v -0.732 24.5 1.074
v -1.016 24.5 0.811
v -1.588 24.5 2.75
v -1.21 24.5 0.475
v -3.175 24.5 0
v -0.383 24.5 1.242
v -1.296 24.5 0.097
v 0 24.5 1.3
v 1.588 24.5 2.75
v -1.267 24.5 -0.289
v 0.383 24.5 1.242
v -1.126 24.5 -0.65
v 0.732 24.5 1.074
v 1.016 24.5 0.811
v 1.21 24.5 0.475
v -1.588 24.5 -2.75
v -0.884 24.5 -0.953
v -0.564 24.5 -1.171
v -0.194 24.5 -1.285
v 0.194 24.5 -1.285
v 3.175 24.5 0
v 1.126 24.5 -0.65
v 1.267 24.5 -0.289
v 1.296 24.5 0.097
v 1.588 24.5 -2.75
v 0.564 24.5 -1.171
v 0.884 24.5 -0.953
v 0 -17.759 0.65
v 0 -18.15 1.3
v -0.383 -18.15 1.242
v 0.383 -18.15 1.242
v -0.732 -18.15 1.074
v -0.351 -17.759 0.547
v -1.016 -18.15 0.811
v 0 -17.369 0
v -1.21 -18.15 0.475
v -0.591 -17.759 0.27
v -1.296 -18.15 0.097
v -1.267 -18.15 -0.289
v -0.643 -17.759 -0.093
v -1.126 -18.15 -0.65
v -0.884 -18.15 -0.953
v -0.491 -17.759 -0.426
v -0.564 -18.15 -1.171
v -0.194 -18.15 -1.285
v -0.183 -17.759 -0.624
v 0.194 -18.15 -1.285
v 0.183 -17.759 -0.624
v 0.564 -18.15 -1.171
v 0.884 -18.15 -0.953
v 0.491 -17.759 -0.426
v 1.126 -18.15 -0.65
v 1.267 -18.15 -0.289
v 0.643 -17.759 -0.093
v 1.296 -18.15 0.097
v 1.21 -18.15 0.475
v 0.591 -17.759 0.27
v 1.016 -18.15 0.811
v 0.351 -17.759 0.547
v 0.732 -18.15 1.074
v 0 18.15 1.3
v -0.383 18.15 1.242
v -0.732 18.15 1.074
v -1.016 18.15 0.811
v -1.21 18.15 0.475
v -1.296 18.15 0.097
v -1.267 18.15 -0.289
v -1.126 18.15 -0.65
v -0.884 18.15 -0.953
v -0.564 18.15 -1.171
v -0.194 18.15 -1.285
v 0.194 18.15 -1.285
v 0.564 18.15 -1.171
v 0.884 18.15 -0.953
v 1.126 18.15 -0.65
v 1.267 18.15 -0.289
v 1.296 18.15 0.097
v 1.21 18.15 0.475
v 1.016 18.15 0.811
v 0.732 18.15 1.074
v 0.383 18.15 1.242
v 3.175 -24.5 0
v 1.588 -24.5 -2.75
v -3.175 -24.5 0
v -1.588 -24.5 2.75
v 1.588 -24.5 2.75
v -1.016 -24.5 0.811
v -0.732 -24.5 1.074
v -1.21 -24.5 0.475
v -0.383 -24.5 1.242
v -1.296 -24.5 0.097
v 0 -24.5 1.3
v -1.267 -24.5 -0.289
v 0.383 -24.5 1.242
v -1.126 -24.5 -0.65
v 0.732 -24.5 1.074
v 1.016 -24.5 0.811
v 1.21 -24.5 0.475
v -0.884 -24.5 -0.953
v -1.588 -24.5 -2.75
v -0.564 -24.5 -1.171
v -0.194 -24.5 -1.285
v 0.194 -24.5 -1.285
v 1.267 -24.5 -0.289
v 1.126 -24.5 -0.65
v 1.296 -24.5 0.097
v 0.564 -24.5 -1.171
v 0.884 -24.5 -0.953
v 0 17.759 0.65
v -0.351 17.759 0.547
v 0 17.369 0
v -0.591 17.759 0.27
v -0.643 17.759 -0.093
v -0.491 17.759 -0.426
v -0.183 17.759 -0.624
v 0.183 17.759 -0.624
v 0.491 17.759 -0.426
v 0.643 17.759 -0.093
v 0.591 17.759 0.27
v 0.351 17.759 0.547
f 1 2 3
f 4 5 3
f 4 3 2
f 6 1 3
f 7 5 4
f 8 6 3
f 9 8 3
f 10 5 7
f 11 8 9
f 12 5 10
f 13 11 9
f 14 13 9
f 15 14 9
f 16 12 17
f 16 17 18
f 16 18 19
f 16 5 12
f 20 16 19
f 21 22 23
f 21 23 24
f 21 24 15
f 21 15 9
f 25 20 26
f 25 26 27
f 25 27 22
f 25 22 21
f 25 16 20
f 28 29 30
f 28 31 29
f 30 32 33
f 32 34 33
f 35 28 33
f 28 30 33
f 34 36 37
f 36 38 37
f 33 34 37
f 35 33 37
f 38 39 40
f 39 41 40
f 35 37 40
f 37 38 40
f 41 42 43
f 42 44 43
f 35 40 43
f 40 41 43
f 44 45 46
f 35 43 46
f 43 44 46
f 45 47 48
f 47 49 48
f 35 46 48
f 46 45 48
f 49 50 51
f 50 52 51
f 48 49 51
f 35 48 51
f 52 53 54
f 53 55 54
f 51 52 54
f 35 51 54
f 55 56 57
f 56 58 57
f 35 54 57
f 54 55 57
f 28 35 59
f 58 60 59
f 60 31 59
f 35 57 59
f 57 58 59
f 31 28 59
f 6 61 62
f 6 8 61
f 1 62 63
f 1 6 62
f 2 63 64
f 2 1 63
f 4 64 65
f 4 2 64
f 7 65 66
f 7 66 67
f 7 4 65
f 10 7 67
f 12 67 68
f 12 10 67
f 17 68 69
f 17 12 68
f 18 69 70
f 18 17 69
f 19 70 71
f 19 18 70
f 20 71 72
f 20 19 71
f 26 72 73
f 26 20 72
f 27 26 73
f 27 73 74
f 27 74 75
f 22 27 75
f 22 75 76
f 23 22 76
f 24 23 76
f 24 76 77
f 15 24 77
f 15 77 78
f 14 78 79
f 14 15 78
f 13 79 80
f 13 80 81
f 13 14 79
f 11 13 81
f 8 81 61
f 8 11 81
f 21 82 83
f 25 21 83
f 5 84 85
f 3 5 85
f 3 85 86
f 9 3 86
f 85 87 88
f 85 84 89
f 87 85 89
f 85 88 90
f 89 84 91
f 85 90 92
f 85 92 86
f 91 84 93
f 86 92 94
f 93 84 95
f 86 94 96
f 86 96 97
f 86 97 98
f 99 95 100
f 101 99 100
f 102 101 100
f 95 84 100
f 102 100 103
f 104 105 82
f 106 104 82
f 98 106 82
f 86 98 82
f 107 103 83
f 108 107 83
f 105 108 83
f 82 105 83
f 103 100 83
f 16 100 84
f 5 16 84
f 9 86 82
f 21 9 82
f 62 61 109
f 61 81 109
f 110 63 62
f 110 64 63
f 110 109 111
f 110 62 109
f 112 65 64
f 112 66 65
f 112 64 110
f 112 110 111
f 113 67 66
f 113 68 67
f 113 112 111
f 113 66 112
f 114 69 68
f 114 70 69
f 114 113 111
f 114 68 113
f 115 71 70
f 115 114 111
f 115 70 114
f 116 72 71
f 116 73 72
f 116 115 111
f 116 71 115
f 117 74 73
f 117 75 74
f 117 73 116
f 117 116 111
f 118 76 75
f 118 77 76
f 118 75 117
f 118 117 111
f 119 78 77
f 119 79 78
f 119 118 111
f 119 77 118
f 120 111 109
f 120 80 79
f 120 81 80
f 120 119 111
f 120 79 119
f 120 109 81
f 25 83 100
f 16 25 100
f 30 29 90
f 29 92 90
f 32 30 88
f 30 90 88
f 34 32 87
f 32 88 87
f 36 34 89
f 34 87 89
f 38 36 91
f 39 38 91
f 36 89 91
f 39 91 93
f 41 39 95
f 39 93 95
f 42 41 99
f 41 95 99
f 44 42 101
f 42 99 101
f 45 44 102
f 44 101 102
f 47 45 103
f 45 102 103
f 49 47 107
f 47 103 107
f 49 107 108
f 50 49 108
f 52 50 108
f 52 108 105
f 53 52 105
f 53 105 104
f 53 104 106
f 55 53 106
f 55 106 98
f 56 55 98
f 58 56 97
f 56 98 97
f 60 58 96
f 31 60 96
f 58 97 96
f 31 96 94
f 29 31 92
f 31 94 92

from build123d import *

# Parameters (mm, degrees)
BOSS_EXTRU_1_DEPTH      = 24.5
BOSS_EXTRU_1_DEPTH_BACK = 24.5


with BuildPart() as part:
    # Esquisse1 → Boss.-Extru.1 (new, two sides: drawn at the far end of the back side and taken through both)
    with BuildSketch(Plane(origin=(0, 0, 0), x_dir=(1, 0, 0), z_dir=(0, 1, 0)).offset(-BOSS_EXTRU_1_DEPTH_BACK)):
        Polygon((3.175426481, 0), (1.58771324, 2.75), (-1.58771324, 2.75), (-3.175426481, 0), (-1.58771324, -2.75), (1.58771324, -2.75), align=None)
    extrude(amount=BOSS_EXTRU_1_DEPTH + BOSS_EXTRU_1_DEPTH_BACK)

    # Esquisse3 → Dégagement M31 (revolve, cut)
    with BuildSketch(Plane(origin=(0, 24.5, 0), x_dir=(0, 0, 1), z_dir=(1, 0, 0))):
        Polygon((0, 0), (0, 7.131118805), (1.3, 6.35), (1.3, 0), align=None)
    d_gagement_m31 = revolve(axis=Axis((0, 30.85, 0), (0, -1, 0)), mode=Mode.SUBTRACT)

    # Symétrie1: Dégagement M31 across plane
    add(d_gagement_m31.mirror(Plane.ZX), mode=Mode.SUBTRACT)


solid = part.part
